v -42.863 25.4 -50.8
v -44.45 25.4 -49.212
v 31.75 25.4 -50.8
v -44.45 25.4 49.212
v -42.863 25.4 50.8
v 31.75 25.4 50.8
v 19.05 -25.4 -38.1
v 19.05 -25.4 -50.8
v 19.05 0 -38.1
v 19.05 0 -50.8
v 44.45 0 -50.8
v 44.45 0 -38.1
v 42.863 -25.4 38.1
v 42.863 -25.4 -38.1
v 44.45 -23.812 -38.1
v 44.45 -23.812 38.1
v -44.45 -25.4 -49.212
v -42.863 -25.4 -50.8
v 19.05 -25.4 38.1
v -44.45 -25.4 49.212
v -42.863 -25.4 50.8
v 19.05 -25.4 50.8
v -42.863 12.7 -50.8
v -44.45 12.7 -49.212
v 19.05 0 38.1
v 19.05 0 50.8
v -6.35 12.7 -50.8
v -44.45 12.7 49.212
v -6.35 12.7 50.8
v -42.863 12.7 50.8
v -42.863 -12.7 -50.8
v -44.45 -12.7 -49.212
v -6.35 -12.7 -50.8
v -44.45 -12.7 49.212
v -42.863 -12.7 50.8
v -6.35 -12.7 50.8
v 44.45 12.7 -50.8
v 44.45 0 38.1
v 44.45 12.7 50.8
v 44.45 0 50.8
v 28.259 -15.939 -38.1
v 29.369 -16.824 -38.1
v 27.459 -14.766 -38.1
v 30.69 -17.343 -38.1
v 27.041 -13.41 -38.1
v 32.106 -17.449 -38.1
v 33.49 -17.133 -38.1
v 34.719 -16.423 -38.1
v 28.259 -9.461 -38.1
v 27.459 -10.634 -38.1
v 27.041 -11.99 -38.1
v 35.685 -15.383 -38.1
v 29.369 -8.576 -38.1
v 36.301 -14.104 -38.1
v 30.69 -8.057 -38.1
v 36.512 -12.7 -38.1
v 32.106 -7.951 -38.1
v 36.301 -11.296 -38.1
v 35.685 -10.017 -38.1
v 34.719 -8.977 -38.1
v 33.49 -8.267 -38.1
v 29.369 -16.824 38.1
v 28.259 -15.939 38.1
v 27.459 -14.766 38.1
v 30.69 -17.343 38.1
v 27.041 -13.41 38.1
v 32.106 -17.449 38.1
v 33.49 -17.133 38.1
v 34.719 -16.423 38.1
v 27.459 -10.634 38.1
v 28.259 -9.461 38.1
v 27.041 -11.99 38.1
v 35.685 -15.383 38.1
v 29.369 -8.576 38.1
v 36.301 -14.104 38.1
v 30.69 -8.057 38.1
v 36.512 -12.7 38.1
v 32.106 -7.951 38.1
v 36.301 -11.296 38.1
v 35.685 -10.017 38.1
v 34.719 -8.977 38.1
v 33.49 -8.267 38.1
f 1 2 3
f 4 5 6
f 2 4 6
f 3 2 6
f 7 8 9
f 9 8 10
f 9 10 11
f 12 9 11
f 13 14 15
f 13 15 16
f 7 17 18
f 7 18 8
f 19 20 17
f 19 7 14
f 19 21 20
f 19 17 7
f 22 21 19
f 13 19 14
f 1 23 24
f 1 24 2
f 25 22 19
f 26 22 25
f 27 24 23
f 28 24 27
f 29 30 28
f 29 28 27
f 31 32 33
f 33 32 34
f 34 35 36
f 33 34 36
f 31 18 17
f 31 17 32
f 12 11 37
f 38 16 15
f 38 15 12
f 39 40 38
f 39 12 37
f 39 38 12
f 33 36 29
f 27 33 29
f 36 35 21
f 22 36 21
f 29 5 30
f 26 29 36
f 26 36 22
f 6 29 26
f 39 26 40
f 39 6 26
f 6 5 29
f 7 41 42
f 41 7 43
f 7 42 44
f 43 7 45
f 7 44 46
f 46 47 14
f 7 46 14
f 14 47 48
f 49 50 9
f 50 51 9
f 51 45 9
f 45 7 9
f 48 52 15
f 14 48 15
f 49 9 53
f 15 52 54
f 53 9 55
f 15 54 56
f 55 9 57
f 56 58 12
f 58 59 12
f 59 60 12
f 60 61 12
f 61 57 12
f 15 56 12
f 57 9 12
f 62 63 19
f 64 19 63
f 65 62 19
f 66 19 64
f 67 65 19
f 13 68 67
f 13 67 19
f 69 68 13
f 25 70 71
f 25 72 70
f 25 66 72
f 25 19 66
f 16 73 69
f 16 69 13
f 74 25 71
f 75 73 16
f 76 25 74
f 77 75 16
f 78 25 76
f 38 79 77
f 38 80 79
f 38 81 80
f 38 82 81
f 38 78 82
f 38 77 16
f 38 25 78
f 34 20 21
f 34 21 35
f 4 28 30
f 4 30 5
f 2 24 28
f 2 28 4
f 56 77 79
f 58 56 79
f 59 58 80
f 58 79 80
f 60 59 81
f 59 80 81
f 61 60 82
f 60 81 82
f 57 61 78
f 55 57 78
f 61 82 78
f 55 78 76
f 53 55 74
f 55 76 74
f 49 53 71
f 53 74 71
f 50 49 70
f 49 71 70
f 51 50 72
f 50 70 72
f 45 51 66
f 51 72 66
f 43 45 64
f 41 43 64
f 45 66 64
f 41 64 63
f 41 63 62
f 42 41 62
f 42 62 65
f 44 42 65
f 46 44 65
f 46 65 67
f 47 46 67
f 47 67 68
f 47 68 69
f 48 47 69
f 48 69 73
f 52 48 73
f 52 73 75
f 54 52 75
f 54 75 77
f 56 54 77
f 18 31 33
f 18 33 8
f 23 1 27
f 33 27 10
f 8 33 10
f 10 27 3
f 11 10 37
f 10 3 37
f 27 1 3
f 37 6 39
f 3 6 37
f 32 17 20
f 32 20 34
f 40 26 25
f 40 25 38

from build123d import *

# Parameters (mm, degrees)
SKETCH1_W           = 88.9
SKETCH1_H           = 50.8
BOSS_EXTRUDE1_DEPTH = 50.8
SKETCH2_W           = 25.4
SKETCH2_H           = 25.4
CUT_EXTRUDE1_DEPTH  = 12.7
SKETCH3_R           = 4.7625
CUT_EXTRUDE2_DEPTH  = 103.587389576
SKETCH4_W           = 38.1
SKETCH4_H           = 25.4
CUT_EXTRUDE3_DEPTH  = 114.769602707
CHAMFER1_SIZE       = 12.7
CHAMFER2_SIZE       = 1.5875


with BuildPart() as part:
    # Sketch1 → Boss-Extrude1 (new, symmetric)
    with BuildSketch(Plane.XY):
        Rectangle(SKETCH1_W, SKETCH1_H)
    extrude(amount=BOSS_EXTRUDE1_DEPTH, both=True)

    # Sketch2 → Cut-Extrude1 (cut)
    with BuildSketch(Plane.XY.offset(50.8)):
        with Locations((31.75, -12.7)):
            Rectangle(SKETCH2_W, SKETCH2_H)
    cut_extrude1 = extrude(amount=-CUT_EXTRUDE1_DEPTH, mode=Mode.SUBTRACT)

    # Sketch3 → Cut-Extrude2 (cut, through all)
    with BuildSketch(Plane.XY.offset(38.1)):
        with Locations((31.75, -12.7)):
            Circle(SKETCH3_R)
    extrude(amount=-CUT_EXTRUDE2_DEPTH, mode=Mode.SUBTRACT)

    # Mirror1: Cut-Extrude1 across plane
    add(cut_extrude1.mirror(Plane.XY), mode=Mode.SUBTRACT)

    # Sketch4 → Cut-Extrude3 (cut, through all)
    with BuildSketch(Plane.XY.offset(50.8)):
        with Locations((-25.4, 0)):
            Rectangle(SKETCH4_W, SKETCH4_H)
    extrude(amount=-CUT_EXTRUDE3_DEPTH, mode=Mode.SUBTRACT)

    # Chamfer1
    chamfer1_edges = [part.edges().sort_by_distance(p)[0] for p in [
        (44.45, 25.4, 0),
    ]]
    chamfer(chamfer1_edges, length=CHAMFER1_SIZE)

    # Chamfer2
    chamfer2_edges = [part.edges().sort_by_distance(p)[0] for p in [
        (44.45, -25.4, 0),
        (-44.45, 19.05, 50.8),
        (-44.45, -19.05, 50.8),
        (-44.45, -19.05, -50.8),
        (-44.45, 19.05, -50.8),
    ]]
    chamfer(chamfer2_edges, length=CHAMFER2_SIZE)


solid = part.part
